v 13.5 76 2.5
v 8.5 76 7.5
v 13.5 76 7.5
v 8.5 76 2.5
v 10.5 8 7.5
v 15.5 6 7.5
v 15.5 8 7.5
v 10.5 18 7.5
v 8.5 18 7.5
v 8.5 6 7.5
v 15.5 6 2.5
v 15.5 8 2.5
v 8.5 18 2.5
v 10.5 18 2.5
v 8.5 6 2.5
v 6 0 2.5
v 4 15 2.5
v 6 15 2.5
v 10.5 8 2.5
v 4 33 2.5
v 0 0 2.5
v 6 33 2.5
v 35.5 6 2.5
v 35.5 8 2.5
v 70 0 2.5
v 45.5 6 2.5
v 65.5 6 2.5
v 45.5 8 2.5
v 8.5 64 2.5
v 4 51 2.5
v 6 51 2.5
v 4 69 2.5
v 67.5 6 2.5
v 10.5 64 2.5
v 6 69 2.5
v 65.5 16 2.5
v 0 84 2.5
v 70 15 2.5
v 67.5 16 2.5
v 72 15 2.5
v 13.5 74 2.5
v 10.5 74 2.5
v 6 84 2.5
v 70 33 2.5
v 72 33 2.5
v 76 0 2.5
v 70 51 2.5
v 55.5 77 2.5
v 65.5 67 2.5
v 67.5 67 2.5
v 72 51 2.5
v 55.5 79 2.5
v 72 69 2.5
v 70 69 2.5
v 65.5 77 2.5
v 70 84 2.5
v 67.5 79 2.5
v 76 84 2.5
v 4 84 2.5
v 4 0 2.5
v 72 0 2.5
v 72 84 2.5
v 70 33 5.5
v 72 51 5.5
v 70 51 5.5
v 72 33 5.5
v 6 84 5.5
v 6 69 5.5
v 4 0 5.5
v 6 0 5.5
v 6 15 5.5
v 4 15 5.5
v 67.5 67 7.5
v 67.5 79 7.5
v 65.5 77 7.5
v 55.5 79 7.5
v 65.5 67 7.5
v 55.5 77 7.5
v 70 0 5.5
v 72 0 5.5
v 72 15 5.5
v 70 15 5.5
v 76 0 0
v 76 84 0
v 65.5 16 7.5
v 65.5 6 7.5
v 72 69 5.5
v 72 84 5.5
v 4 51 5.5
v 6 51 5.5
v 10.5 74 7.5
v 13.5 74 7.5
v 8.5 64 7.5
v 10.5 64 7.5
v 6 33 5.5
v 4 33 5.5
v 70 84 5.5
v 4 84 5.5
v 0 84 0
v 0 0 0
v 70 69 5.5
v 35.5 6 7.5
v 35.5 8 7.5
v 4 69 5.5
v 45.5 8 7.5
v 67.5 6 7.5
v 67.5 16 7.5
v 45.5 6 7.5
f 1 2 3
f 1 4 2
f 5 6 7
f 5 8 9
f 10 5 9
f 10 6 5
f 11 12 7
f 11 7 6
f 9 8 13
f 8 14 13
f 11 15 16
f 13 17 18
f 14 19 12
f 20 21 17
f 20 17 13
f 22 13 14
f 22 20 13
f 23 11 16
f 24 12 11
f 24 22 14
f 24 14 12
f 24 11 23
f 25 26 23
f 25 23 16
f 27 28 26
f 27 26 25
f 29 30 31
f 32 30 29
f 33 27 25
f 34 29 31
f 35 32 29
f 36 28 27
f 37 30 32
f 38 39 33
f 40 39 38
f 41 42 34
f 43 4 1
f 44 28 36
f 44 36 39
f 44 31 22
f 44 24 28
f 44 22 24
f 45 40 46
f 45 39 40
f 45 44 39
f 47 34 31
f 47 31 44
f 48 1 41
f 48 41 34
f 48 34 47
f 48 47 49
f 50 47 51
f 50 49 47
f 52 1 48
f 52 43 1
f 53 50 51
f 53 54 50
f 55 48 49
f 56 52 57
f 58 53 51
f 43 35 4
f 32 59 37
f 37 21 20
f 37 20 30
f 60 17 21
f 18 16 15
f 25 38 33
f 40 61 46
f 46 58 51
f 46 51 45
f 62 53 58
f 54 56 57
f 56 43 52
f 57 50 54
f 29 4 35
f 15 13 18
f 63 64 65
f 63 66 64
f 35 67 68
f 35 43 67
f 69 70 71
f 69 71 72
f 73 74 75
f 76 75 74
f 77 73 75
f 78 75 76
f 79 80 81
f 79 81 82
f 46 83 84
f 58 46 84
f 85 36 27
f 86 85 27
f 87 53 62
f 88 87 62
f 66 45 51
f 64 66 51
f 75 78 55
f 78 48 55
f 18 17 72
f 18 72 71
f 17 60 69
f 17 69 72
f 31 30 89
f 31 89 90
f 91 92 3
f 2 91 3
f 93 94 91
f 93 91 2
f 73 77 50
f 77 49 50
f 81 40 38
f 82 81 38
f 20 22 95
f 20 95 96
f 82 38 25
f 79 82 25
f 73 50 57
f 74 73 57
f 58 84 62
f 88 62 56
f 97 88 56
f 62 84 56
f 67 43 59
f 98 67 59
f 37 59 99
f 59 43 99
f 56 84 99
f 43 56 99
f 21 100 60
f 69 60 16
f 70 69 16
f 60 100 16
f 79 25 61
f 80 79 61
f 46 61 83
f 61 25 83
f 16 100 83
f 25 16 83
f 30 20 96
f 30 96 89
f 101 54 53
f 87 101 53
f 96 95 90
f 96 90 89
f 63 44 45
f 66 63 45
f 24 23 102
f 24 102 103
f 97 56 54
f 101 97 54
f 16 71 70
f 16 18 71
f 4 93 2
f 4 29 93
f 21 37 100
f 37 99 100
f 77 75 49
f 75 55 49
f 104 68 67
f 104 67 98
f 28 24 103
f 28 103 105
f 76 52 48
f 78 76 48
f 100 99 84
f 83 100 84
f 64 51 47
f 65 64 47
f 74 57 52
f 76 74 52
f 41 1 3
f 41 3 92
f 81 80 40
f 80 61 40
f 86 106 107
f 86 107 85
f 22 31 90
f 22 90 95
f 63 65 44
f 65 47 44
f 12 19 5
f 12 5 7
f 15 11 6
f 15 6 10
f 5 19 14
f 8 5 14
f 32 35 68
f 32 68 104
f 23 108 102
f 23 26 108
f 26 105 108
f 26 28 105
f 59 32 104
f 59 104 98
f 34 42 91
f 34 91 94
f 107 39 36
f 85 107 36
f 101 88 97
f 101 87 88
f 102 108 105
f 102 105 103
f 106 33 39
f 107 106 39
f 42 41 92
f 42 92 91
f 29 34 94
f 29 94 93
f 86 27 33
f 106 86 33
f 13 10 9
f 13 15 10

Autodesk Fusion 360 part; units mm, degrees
sketch "Sketch1" plane through (0, 0, 0) normal (0, 0, 1) x (1, 0, 0)
  line L0 (0, 0) -> (76, 0)
  line L1 (76, 0) -> (76, 84)
  line L2 (76, 84) -> (0, 84)
  line L3 (0, 84) -> (0, 0)
  dimension "d1" = 76
  dimension "d2" = 84
extrude "Extrude1" add sketch "Sketch1" along normal blind 2.5
sketch "Sketch2" plane through (0, 0, 2.5) normal (0, 0, 1) x (-1, 0, 0)
  line L0 (0, -84) -> (0, 0)
  line L1 (0, 0) -> (-76, 0)
  line L2 (-76, 0) -> (-76, -84)
  line L3 (-76, -84) -> (0, -84)
  line L4 (0, -84) -> (-4, -84)
  line L5 (-4, -84) -> (-6, -84)
  line L6 (-6, -84) -> (-6, -69)
  line L7 (-6, -69) -> (-4, -69)
  line L8 (-4, -69) -> (-4, -84)
  line L9 (-4, -69) -> (-4, -51)
  line L10 (-4, -51) -> (-6, -51)
  line L11 (-6, -51) -> (-6, -33)
  line L12 (-6, -33) -> (-4, -33)
  line L13 (-4, -33) -> (-4, -51)
  line L14 (-4, -33) -> (-4, -15)
  line L15 (-4, -15) -> (-6, -15)
  line L16 (-6, -15) -> (-6, 0)
  line L17 (-6, 0) -> (-4, 0)
  line L18 (-4, 0) -> (-4, -15)
  line L19 (-6, -84) -> (-40, -84)
  line L20 (-4, -84) -> (-38, -84)
  line L21 (-38, -84) -> (-38, -65)
  line L22 (-72, -69) -> (-72, -84)
  line L23 (-70, -84) -> (-70, -69)
  line L24 (-72, -84) -> (-38, -84)
  line L25 (-70, -69) -> (-72, -69)
  line L26 (-72, -51) -> (-70, -51)
  line L27 (-70, -51) -> (-70, -33)
  line L28 (-72, -33) -> (-72, -51)
  line L29 (-70, -33) -> (-72, -33)
  line L30 (-72, -15) -> (-70, -15)
  line L31 (-70, -15) -> (-70, 0)
  line L32 (-72, 0) -> (-72, -15)
  line L33 (-70, 0) -> (-72, 0)
  dimension "d5" = 4
  dimension "d6" = 2
  dimension "d7" = 15
  dimension "d8" = 18
  dimension "d9" = 2
  dimension "d10" = 18
  dimension "d11" = 18
  dimension "d12" = 2
  dimension "d13" = 15
  dimension "d15" = 34
extrude "Extrude2" add sketch "Sketch2" along normal blind 3 contours L3 L5 L6 L7 L8 L20 | L1 L15 L16 L17 L18 | L10 L11 L12 L13 | L1 L30 L31 L32 L33 | L3 L22 L23 L24 L25 | L26 L27 L28 L29
sketch "Sketch3" plane through (0, 0, 2.5) normal (0, 0, 1) x (-1, 0, 0)
  line L0 (-72, -15) -> (-72, 0)
  line L1 (-72, 0) -> (-76, 0)
  line L2 (-76, 0) -> (-76, -84)
  line L3 (-76, -84) -> (-72, -84)
  line L4 (-72, -84) -> (-72, -69)
  line L5 (-72, -69) -> (-70, -69)
  line L6 (-70, -69) -> (-70, -84)
  line L7 (-70, -84) -> (-6, -84)
  line L8 (-6, -84) -> (-6, -69)
  line L9 (-6, -69) -> (-4, -69)
  line L10 (-4, -69) -> (-4, -84)
  line L11 (-4, -84) -> (0, -84)
  line L12 (0, -84) -> (0, 0)
  line L13 (0, 0) -> (-4, 0)
  line L14 (-4, 0) -> (-4, -15)
  line L15 (-4, -15) -> (-6, -15)
  line L16 (-6, -15) -> (-6, 0)
  line L17 (-6, 0) -> (-70, 0)
  line L18 (-70, 0) -> (-70, -15)
  line L19 (-70, -15) -> (-72, -15)
  line L20 (-4, -33) -> (-4, -51)
  line L21 (-4, -51) -> (-6, -51)
  line L22 (-6, -51) -> (-6, -33)
  line L23 (-6, -33) -> (-4, -33)
  line L24 (-70, -33) -> (-70, -51)
  line L25 (-70, -51) -> (-72, -51)
  line L26 (-72, -51) -> (-72, -33)
  line L27 (-72, -33) -> (-70, -33)
  line L28 (-70, -84) -> (-67.5, -84)
  line L29 (-67.5, -84) -> (-67.5, -79)
  line L30 (-67.5, -79) -> (-55.5, -79)
  line L31 (-55.5, -79) -> (-55.5, -77)
  line L32 (-55.5, -77) -> (-67.5, -77)
  line L33 (-67.5, -77) -> (-67.5, -79)
  line L34 (-67.5, -77) -> (-65.5, -77)
  line L35 (-65.5, -77) -> (-65.5, -67)
  line L36 (-65.5, -67) -> (-67.5, -67)
  line L37 (-67.5, -67) -> (-67.5, -77)
  line L38 (-67.5, -79) -> (-8.5, -79)
  line L39 (-8.5, -79) -> (-8.5, -76)
  line L40 (-8.5, -76) -> (-13.5, -76)
  line L41 (-13.5, -76) -> (-13.5, -74)
  line L42 (-13.5, -74) -> (-8.5, -74)
  line L43 (-8.5, -74) -> (-8.5, -76)
  line L44 (-8.5, -74) -> (-10.5, -74)
  line L45 (-10.5, -74) -> (-10.5, -64)
  line L46 (-10.5, -64) -> (-8.5, -64)
  line L47 (-8.5, -64) -> (-8.5, -74)
  line L48 (-67.5, -67) -> (-67.5, -16)
  line L49 (-67.5, -16) -> (-65.5, -16)
  line L50 (-65.5, -16) -> (-65.5, -6)
  line L51 (-65.5, -6) -> (-67.5, -6)
  line L52 (-67.5, -6) -> (-67.5, -16)
  line L53 (-65.5, -6) -> (-45.5, -6)
  line L54 (-45.5, -6) -> (-35.5, -6)
  line L55 (-35.5, -6) -> (-35.5, -8)
  line L56 (-35.5, -8) -> (-45.5, -8)
  line L57 (-45.5, -8) -> (-45.5, -6)
  line L58 (-35.5, -6) -> (-15.5, -6)
  line L59 (-15.5, -6) -> (-8.5, -6)
  line L60 (-8.5, -6) -> (-8.5, -8)
  line L61 (-8.5, -8) -> (-15.5, -8)
  line L62 (-15.5, -8) -> (-15.5, -6)
  line L63 (-8.5, -8) -> (-10.5, -8)
  line L64 (-10.5, -8) -> (-10.5, -18)
  line L65 (-10.5, -18) -> (-8.5, -18)
  line L66 (-8.5, -18) -> (-8.5, -8)
  dimension "d19" = 2.5
  dimension "d20" = 5
  dimension "d21" = 12
  dimension "d22" = 2
  dimension "d23" = 2
  dimension "d24" = 10
  dimension "d25" = 59
  dimension "d26" = 3
  dimension "d27" = 5
  dimension "d28" = 2
  dimension "d29" = 10
  dimension "d30" = 51
  dimension "d31" = 2
  dimension "d32" = 10
  dimension "d33" = 20
  dimension "d34" = 10
  dimension "d35" = 2
  dimension "d36" = 20
  dimension "d37" = 7
  dimension "d38" = 2
  dimension "d39" = 2
  dimension "d40" = 10
extrude "Extrude3" add sketch "Sketch3" along normal blind 5 contours L59 L60 L61 L62 L63 | L54 L55 L56 L57 | L49 L50 L51 L52 | L40 L41 L42 L43 L44 | L30 L31 L32 L33 L34 L38 | L32 L34 L35 L36 L37 | L42 L44 L45 L46 L47 | L61 L63 L64 L65 L66
